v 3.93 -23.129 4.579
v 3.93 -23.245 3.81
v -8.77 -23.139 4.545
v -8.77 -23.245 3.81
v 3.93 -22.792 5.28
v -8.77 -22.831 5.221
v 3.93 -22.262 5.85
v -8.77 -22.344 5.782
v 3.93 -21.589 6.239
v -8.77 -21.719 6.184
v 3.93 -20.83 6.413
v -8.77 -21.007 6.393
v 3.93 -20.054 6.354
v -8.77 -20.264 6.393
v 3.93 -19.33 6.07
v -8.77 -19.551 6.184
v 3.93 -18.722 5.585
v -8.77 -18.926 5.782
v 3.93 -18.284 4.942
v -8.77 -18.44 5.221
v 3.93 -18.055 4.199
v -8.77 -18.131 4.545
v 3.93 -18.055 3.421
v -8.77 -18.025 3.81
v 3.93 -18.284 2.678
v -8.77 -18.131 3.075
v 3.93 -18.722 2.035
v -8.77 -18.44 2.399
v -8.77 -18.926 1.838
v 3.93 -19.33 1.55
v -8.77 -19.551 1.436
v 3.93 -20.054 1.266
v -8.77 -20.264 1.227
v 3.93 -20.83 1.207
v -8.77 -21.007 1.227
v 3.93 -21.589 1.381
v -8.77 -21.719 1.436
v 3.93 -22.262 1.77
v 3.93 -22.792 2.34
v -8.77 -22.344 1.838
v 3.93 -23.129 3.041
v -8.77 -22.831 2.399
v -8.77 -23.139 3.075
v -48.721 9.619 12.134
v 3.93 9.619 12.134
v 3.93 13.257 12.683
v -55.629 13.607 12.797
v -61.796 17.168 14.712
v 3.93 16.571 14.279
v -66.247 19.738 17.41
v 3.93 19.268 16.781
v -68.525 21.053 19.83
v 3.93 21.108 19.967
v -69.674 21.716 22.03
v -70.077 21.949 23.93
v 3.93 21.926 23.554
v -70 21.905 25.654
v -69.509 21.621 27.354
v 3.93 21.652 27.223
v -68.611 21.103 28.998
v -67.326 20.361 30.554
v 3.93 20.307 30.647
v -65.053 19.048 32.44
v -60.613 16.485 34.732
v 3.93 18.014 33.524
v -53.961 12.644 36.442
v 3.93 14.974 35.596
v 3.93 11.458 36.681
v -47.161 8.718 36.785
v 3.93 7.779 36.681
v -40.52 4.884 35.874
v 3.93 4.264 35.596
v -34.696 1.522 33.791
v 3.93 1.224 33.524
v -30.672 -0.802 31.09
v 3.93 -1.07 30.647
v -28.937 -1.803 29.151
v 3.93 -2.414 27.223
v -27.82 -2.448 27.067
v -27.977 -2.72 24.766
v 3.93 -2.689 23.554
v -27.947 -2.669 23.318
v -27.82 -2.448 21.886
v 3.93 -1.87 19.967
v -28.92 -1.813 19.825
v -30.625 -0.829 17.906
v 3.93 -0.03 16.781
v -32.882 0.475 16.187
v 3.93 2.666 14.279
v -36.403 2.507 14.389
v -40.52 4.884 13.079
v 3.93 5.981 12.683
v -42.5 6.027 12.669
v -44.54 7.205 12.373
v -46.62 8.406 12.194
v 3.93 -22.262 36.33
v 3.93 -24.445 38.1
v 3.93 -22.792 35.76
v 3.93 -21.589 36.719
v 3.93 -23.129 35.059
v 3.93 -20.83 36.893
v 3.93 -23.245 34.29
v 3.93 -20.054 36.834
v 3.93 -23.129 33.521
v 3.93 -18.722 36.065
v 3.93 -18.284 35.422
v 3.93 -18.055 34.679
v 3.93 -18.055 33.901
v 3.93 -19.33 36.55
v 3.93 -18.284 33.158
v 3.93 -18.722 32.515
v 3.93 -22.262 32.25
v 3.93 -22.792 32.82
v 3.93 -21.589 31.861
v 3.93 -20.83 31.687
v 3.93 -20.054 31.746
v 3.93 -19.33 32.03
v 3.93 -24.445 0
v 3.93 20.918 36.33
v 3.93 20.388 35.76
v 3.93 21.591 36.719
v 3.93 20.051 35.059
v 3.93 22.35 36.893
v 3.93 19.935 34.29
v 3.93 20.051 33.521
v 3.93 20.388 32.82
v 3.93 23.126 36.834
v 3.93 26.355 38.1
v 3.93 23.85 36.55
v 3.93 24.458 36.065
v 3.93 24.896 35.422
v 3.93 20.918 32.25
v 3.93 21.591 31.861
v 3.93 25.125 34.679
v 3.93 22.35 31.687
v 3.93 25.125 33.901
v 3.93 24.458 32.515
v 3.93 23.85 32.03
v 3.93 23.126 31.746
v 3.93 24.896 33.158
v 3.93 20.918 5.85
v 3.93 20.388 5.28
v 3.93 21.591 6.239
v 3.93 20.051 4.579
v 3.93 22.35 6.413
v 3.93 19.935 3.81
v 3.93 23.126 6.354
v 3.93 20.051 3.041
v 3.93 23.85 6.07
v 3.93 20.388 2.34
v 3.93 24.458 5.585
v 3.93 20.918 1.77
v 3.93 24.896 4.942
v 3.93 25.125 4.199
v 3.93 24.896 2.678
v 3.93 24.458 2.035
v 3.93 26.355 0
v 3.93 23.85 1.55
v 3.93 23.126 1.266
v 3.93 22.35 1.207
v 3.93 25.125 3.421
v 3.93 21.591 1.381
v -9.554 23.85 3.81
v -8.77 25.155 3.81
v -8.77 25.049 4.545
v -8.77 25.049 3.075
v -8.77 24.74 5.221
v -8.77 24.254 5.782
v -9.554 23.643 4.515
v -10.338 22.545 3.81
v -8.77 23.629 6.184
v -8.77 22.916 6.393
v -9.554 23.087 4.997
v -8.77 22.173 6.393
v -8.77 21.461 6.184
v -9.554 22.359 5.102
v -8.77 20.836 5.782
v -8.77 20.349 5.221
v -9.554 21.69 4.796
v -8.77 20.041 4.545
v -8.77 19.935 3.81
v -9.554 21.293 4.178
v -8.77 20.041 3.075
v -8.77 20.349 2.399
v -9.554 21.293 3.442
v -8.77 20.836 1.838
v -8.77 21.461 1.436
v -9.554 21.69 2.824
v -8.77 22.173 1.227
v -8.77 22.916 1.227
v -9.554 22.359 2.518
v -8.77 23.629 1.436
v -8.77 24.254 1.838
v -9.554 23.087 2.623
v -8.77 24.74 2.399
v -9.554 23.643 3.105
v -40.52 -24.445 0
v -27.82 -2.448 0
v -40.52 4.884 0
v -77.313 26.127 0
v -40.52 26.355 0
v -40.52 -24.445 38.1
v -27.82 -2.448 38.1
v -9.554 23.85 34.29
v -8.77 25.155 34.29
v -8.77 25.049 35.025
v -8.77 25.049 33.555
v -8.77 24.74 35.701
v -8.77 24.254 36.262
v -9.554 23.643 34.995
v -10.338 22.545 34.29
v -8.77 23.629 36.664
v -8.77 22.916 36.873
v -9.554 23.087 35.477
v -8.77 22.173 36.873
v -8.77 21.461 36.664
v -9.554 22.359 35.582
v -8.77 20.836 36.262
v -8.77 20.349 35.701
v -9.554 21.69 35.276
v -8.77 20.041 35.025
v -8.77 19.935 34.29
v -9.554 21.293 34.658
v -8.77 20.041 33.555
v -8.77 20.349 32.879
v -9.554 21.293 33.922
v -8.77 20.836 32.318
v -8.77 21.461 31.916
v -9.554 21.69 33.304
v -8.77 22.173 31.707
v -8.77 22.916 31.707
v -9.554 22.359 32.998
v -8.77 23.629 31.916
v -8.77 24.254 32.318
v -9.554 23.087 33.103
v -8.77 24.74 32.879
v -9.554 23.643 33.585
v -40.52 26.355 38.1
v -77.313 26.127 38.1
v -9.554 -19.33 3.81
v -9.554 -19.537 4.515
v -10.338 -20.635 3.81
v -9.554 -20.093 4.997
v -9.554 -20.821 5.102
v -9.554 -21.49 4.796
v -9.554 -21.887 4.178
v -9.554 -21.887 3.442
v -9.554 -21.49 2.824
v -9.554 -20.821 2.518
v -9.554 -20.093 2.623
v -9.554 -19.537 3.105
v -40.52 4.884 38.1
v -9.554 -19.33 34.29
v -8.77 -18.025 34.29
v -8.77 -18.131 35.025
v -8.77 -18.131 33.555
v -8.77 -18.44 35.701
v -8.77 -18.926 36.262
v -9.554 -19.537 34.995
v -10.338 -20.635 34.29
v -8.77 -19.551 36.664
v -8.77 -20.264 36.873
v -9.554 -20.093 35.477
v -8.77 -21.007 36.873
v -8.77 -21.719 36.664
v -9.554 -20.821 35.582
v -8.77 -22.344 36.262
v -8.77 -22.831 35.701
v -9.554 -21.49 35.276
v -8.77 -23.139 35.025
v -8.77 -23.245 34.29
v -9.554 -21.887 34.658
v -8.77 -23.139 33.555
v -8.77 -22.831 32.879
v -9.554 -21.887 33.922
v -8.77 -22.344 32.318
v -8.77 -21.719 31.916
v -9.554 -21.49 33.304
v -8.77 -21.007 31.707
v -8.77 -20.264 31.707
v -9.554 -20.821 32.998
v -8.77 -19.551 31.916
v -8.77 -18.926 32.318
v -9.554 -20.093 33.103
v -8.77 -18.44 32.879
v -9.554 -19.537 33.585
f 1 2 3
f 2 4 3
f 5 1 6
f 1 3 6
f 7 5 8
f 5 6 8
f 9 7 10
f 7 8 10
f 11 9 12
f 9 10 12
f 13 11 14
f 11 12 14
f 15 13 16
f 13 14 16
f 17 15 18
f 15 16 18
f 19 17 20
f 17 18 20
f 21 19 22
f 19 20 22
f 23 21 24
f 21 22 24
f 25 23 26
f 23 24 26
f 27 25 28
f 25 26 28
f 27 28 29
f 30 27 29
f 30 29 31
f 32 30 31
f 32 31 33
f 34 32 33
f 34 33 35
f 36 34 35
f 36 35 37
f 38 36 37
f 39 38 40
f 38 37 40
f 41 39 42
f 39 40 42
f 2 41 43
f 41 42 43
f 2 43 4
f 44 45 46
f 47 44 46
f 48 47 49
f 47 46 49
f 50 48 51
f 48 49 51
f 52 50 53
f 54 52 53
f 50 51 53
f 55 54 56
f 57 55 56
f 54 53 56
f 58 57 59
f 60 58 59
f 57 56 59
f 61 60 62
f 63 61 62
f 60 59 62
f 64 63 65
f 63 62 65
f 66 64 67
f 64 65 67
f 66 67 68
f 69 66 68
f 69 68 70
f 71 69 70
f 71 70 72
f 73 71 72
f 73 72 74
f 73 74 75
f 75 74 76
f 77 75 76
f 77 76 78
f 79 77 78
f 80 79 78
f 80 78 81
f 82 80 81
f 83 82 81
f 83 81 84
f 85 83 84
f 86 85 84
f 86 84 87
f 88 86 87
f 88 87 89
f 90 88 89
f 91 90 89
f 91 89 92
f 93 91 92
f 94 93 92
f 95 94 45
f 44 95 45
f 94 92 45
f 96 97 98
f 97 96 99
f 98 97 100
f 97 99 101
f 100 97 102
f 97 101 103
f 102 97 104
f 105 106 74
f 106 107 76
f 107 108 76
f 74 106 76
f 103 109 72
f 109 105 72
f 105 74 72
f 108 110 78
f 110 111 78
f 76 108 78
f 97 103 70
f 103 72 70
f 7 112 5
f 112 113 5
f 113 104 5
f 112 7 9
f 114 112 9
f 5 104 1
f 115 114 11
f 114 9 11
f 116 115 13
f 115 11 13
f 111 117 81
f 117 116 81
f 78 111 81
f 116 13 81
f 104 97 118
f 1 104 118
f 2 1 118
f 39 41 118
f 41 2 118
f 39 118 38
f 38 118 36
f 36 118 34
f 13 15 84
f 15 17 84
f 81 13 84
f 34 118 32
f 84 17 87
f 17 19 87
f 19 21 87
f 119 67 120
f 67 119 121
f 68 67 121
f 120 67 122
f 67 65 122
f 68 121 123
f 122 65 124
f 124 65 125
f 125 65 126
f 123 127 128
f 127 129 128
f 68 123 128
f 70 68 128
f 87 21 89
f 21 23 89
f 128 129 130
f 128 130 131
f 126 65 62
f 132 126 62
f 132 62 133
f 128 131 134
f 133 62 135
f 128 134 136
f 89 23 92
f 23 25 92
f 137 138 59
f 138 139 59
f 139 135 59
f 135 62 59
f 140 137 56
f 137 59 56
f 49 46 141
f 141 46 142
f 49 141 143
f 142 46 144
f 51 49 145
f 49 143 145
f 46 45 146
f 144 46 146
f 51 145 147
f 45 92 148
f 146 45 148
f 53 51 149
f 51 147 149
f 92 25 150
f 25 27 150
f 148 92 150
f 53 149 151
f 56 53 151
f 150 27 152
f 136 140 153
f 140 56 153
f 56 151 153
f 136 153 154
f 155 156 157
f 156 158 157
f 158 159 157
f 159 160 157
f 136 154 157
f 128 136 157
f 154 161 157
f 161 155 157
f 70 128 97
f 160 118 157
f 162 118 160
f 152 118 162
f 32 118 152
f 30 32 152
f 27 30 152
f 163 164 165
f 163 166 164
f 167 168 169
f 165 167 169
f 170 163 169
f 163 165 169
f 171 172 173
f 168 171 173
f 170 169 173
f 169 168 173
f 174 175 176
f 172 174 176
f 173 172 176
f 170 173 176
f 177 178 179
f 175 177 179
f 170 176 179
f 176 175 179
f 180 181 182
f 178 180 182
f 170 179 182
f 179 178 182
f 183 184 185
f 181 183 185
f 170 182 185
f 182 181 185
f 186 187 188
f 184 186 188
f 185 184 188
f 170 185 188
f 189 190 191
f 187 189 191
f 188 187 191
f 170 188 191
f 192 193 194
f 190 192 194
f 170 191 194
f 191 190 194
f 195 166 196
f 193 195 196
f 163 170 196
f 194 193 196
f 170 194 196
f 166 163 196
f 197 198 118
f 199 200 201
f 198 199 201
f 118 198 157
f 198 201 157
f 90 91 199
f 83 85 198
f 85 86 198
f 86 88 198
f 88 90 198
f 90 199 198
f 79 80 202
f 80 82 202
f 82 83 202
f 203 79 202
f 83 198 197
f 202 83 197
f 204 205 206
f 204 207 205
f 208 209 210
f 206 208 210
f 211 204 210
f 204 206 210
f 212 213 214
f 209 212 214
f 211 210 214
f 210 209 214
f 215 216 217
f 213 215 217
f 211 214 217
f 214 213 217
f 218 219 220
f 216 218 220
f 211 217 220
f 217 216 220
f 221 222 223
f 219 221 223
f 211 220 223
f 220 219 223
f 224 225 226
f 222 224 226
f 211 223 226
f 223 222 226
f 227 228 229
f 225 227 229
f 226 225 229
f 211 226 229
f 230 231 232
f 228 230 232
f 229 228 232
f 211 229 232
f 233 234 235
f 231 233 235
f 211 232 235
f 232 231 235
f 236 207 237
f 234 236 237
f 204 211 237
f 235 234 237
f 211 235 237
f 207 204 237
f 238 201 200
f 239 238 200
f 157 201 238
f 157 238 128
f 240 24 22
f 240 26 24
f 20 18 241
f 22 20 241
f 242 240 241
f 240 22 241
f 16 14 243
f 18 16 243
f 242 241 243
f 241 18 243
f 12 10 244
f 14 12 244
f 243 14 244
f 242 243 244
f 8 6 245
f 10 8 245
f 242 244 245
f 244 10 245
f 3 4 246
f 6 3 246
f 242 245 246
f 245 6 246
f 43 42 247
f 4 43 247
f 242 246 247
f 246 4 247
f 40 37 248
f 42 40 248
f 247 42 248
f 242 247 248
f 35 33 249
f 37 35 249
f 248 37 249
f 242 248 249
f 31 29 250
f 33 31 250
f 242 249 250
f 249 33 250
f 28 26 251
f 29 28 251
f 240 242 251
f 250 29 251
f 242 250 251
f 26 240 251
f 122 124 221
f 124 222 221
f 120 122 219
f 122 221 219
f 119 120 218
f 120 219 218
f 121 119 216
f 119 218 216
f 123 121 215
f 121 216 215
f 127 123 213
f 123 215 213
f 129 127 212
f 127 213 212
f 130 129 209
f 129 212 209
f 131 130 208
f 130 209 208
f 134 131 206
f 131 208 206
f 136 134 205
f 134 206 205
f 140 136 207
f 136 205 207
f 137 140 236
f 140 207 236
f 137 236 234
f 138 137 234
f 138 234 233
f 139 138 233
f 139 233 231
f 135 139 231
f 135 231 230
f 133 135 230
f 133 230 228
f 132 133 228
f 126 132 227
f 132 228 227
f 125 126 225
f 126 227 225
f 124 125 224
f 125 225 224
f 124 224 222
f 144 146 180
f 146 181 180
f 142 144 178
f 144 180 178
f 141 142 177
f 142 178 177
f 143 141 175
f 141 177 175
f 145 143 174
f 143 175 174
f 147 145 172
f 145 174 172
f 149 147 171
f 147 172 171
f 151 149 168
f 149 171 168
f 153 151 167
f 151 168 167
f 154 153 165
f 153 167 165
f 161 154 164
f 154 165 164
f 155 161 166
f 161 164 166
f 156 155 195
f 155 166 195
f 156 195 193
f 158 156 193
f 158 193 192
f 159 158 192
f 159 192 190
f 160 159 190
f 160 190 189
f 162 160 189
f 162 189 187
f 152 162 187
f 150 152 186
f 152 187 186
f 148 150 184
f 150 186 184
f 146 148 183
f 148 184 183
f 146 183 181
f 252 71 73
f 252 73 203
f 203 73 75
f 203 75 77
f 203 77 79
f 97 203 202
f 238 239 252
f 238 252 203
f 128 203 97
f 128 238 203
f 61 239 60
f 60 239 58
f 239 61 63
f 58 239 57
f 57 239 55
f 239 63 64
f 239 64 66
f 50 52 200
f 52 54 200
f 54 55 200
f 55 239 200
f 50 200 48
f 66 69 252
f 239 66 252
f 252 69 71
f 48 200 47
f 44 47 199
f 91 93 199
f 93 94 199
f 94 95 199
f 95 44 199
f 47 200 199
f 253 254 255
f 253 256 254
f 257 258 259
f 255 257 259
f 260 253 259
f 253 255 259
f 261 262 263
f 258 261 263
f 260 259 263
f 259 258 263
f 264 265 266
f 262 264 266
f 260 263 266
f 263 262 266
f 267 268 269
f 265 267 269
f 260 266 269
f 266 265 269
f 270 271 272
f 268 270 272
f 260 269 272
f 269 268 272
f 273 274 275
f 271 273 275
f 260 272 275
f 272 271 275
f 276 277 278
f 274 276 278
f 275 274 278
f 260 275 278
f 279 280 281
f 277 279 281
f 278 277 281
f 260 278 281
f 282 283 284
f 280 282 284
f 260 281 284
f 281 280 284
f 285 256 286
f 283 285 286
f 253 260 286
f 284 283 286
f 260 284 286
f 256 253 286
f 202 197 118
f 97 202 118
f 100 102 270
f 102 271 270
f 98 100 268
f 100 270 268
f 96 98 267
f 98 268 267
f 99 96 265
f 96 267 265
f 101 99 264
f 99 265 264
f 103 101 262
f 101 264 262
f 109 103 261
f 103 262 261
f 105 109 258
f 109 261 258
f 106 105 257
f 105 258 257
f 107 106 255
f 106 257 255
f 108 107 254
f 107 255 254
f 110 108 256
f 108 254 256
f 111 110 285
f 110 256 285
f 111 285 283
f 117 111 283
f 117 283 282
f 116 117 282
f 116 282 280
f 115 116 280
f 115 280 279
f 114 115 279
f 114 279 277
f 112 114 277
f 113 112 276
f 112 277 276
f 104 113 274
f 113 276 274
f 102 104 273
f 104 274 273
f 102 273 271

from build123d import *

# Parameters (mm, degrees)
SKETCH2_W                       = 44.45
SKETCH2_H                       = 50.8
BOSS_EXTRUDE2_DEPTH             = 38.1
F_5_0_2055_DIAMETER_HOLE1_D     = 5.2197
F_5_0_2055_DIAMETER_HOLE1_DEPTH = 12.7
F_5_0_2055_DIAMETER_HOLE1_TIP   = 1.568156087
BOSS_EXTRUDE3_DEPTH             = 38.1
CUT_EXTRUDE2_DEPTH              = 39.1
SKETCH3_R                       = 12.342015131
CUT_EXTRUDE1_DEPTH              = 1
CUT_EXTRUDE1_DEPTH_BACK         = 82.243351826


with BuildPart() as part:
    # Sketch2 → Boss-Extrude2 (new body)
    with BuildSketch(Plane.XY):
        with Locations((-18.295089844, 0.954798727)):
            Rectangle(SKETCH2_W, SKETCH2_H)
    extrude(amount=BOSS_EXTRUDE2_DEPTH)

    # #5 (0.2055) Diameter Hole1
    with Locations(Plane(origin=(3.929910156, 22.544798727, 34.29), x_dir=(0, 1, 0), z_dir=(1, 0, 0))):
        with Locations((0, 0), (0, -30.48), (-43.18, -30.48), (-43.18, 0)):
            Hole(F_5_0_2055_DIAMETER_HOLE1_D / 2, depth=F_5_0_2055_DIAMETER_HOLE1_DEPTH)
            with Locations((0, 0, -(F_5_0_2055_DIAMETER_HOLE1_DEPTH + F_5_0_2055_DIAMETER_HOLE1_TIP / 2))):  # 118° drill point
                Cone(0, F_5_0_2055_DIAMETER_HOLE1_D / 2, F_5_0_2055_DIAMETER_HOLE1_TIP, mode=Mode.SUBTRACT)

    # Sketch6 → Boss-Extrude3 (add)
    with BuildSketch(Plane(origin=(0, 0, 0), x_dir=(-1, 0, 0), z_dir=(0, 0, -1))):
        Polygon((40.520089844, 26.354798727), (77.31344167, 26.126843983), (40.520089844, 4.884192402), align=None)
    extrude(amount=-BOSS_EXTRUDE3_DEPTH)

    # Sketch7 → Cut-Extrude2 (cut, through all)
    with BuildSketch(Plane(origin=(0, 0, 0), x_dir=(-1, 0, 0), z_dir=(0, 0, -1))):
        Polygon((40.520089844, 4.884192402), (27.820089844, -2.448156017), (40.520089844, -24.445201273), align=None)
    extrude(amount=-CUT_EXTRUDE2_DEPTH, mode=Mode.SUBTRACT)

    # Sketch3 → Cut-Extrude1 (cut, two sides)
    with BuildSketch(Plane(origin=(3.929910156, 0, 0), x_dir=(0, 0, -1), z_dir=(1, 0, 0))) as cut_extrude1_sk:
        with Locations((-24.476370381, 9.6189509)):
            Circle(SKETCH3_R)
    extrude(amount=CUT_EXTRUDE1_DEPTH, mode=Mode.SUBTRACT)
    extrude(cut_extrude1_sk.sketch, amount=-CUT_EXTRUDE1_DEPTH_BACK, mode=Mode.SUBTRACT)


solid = part.part
